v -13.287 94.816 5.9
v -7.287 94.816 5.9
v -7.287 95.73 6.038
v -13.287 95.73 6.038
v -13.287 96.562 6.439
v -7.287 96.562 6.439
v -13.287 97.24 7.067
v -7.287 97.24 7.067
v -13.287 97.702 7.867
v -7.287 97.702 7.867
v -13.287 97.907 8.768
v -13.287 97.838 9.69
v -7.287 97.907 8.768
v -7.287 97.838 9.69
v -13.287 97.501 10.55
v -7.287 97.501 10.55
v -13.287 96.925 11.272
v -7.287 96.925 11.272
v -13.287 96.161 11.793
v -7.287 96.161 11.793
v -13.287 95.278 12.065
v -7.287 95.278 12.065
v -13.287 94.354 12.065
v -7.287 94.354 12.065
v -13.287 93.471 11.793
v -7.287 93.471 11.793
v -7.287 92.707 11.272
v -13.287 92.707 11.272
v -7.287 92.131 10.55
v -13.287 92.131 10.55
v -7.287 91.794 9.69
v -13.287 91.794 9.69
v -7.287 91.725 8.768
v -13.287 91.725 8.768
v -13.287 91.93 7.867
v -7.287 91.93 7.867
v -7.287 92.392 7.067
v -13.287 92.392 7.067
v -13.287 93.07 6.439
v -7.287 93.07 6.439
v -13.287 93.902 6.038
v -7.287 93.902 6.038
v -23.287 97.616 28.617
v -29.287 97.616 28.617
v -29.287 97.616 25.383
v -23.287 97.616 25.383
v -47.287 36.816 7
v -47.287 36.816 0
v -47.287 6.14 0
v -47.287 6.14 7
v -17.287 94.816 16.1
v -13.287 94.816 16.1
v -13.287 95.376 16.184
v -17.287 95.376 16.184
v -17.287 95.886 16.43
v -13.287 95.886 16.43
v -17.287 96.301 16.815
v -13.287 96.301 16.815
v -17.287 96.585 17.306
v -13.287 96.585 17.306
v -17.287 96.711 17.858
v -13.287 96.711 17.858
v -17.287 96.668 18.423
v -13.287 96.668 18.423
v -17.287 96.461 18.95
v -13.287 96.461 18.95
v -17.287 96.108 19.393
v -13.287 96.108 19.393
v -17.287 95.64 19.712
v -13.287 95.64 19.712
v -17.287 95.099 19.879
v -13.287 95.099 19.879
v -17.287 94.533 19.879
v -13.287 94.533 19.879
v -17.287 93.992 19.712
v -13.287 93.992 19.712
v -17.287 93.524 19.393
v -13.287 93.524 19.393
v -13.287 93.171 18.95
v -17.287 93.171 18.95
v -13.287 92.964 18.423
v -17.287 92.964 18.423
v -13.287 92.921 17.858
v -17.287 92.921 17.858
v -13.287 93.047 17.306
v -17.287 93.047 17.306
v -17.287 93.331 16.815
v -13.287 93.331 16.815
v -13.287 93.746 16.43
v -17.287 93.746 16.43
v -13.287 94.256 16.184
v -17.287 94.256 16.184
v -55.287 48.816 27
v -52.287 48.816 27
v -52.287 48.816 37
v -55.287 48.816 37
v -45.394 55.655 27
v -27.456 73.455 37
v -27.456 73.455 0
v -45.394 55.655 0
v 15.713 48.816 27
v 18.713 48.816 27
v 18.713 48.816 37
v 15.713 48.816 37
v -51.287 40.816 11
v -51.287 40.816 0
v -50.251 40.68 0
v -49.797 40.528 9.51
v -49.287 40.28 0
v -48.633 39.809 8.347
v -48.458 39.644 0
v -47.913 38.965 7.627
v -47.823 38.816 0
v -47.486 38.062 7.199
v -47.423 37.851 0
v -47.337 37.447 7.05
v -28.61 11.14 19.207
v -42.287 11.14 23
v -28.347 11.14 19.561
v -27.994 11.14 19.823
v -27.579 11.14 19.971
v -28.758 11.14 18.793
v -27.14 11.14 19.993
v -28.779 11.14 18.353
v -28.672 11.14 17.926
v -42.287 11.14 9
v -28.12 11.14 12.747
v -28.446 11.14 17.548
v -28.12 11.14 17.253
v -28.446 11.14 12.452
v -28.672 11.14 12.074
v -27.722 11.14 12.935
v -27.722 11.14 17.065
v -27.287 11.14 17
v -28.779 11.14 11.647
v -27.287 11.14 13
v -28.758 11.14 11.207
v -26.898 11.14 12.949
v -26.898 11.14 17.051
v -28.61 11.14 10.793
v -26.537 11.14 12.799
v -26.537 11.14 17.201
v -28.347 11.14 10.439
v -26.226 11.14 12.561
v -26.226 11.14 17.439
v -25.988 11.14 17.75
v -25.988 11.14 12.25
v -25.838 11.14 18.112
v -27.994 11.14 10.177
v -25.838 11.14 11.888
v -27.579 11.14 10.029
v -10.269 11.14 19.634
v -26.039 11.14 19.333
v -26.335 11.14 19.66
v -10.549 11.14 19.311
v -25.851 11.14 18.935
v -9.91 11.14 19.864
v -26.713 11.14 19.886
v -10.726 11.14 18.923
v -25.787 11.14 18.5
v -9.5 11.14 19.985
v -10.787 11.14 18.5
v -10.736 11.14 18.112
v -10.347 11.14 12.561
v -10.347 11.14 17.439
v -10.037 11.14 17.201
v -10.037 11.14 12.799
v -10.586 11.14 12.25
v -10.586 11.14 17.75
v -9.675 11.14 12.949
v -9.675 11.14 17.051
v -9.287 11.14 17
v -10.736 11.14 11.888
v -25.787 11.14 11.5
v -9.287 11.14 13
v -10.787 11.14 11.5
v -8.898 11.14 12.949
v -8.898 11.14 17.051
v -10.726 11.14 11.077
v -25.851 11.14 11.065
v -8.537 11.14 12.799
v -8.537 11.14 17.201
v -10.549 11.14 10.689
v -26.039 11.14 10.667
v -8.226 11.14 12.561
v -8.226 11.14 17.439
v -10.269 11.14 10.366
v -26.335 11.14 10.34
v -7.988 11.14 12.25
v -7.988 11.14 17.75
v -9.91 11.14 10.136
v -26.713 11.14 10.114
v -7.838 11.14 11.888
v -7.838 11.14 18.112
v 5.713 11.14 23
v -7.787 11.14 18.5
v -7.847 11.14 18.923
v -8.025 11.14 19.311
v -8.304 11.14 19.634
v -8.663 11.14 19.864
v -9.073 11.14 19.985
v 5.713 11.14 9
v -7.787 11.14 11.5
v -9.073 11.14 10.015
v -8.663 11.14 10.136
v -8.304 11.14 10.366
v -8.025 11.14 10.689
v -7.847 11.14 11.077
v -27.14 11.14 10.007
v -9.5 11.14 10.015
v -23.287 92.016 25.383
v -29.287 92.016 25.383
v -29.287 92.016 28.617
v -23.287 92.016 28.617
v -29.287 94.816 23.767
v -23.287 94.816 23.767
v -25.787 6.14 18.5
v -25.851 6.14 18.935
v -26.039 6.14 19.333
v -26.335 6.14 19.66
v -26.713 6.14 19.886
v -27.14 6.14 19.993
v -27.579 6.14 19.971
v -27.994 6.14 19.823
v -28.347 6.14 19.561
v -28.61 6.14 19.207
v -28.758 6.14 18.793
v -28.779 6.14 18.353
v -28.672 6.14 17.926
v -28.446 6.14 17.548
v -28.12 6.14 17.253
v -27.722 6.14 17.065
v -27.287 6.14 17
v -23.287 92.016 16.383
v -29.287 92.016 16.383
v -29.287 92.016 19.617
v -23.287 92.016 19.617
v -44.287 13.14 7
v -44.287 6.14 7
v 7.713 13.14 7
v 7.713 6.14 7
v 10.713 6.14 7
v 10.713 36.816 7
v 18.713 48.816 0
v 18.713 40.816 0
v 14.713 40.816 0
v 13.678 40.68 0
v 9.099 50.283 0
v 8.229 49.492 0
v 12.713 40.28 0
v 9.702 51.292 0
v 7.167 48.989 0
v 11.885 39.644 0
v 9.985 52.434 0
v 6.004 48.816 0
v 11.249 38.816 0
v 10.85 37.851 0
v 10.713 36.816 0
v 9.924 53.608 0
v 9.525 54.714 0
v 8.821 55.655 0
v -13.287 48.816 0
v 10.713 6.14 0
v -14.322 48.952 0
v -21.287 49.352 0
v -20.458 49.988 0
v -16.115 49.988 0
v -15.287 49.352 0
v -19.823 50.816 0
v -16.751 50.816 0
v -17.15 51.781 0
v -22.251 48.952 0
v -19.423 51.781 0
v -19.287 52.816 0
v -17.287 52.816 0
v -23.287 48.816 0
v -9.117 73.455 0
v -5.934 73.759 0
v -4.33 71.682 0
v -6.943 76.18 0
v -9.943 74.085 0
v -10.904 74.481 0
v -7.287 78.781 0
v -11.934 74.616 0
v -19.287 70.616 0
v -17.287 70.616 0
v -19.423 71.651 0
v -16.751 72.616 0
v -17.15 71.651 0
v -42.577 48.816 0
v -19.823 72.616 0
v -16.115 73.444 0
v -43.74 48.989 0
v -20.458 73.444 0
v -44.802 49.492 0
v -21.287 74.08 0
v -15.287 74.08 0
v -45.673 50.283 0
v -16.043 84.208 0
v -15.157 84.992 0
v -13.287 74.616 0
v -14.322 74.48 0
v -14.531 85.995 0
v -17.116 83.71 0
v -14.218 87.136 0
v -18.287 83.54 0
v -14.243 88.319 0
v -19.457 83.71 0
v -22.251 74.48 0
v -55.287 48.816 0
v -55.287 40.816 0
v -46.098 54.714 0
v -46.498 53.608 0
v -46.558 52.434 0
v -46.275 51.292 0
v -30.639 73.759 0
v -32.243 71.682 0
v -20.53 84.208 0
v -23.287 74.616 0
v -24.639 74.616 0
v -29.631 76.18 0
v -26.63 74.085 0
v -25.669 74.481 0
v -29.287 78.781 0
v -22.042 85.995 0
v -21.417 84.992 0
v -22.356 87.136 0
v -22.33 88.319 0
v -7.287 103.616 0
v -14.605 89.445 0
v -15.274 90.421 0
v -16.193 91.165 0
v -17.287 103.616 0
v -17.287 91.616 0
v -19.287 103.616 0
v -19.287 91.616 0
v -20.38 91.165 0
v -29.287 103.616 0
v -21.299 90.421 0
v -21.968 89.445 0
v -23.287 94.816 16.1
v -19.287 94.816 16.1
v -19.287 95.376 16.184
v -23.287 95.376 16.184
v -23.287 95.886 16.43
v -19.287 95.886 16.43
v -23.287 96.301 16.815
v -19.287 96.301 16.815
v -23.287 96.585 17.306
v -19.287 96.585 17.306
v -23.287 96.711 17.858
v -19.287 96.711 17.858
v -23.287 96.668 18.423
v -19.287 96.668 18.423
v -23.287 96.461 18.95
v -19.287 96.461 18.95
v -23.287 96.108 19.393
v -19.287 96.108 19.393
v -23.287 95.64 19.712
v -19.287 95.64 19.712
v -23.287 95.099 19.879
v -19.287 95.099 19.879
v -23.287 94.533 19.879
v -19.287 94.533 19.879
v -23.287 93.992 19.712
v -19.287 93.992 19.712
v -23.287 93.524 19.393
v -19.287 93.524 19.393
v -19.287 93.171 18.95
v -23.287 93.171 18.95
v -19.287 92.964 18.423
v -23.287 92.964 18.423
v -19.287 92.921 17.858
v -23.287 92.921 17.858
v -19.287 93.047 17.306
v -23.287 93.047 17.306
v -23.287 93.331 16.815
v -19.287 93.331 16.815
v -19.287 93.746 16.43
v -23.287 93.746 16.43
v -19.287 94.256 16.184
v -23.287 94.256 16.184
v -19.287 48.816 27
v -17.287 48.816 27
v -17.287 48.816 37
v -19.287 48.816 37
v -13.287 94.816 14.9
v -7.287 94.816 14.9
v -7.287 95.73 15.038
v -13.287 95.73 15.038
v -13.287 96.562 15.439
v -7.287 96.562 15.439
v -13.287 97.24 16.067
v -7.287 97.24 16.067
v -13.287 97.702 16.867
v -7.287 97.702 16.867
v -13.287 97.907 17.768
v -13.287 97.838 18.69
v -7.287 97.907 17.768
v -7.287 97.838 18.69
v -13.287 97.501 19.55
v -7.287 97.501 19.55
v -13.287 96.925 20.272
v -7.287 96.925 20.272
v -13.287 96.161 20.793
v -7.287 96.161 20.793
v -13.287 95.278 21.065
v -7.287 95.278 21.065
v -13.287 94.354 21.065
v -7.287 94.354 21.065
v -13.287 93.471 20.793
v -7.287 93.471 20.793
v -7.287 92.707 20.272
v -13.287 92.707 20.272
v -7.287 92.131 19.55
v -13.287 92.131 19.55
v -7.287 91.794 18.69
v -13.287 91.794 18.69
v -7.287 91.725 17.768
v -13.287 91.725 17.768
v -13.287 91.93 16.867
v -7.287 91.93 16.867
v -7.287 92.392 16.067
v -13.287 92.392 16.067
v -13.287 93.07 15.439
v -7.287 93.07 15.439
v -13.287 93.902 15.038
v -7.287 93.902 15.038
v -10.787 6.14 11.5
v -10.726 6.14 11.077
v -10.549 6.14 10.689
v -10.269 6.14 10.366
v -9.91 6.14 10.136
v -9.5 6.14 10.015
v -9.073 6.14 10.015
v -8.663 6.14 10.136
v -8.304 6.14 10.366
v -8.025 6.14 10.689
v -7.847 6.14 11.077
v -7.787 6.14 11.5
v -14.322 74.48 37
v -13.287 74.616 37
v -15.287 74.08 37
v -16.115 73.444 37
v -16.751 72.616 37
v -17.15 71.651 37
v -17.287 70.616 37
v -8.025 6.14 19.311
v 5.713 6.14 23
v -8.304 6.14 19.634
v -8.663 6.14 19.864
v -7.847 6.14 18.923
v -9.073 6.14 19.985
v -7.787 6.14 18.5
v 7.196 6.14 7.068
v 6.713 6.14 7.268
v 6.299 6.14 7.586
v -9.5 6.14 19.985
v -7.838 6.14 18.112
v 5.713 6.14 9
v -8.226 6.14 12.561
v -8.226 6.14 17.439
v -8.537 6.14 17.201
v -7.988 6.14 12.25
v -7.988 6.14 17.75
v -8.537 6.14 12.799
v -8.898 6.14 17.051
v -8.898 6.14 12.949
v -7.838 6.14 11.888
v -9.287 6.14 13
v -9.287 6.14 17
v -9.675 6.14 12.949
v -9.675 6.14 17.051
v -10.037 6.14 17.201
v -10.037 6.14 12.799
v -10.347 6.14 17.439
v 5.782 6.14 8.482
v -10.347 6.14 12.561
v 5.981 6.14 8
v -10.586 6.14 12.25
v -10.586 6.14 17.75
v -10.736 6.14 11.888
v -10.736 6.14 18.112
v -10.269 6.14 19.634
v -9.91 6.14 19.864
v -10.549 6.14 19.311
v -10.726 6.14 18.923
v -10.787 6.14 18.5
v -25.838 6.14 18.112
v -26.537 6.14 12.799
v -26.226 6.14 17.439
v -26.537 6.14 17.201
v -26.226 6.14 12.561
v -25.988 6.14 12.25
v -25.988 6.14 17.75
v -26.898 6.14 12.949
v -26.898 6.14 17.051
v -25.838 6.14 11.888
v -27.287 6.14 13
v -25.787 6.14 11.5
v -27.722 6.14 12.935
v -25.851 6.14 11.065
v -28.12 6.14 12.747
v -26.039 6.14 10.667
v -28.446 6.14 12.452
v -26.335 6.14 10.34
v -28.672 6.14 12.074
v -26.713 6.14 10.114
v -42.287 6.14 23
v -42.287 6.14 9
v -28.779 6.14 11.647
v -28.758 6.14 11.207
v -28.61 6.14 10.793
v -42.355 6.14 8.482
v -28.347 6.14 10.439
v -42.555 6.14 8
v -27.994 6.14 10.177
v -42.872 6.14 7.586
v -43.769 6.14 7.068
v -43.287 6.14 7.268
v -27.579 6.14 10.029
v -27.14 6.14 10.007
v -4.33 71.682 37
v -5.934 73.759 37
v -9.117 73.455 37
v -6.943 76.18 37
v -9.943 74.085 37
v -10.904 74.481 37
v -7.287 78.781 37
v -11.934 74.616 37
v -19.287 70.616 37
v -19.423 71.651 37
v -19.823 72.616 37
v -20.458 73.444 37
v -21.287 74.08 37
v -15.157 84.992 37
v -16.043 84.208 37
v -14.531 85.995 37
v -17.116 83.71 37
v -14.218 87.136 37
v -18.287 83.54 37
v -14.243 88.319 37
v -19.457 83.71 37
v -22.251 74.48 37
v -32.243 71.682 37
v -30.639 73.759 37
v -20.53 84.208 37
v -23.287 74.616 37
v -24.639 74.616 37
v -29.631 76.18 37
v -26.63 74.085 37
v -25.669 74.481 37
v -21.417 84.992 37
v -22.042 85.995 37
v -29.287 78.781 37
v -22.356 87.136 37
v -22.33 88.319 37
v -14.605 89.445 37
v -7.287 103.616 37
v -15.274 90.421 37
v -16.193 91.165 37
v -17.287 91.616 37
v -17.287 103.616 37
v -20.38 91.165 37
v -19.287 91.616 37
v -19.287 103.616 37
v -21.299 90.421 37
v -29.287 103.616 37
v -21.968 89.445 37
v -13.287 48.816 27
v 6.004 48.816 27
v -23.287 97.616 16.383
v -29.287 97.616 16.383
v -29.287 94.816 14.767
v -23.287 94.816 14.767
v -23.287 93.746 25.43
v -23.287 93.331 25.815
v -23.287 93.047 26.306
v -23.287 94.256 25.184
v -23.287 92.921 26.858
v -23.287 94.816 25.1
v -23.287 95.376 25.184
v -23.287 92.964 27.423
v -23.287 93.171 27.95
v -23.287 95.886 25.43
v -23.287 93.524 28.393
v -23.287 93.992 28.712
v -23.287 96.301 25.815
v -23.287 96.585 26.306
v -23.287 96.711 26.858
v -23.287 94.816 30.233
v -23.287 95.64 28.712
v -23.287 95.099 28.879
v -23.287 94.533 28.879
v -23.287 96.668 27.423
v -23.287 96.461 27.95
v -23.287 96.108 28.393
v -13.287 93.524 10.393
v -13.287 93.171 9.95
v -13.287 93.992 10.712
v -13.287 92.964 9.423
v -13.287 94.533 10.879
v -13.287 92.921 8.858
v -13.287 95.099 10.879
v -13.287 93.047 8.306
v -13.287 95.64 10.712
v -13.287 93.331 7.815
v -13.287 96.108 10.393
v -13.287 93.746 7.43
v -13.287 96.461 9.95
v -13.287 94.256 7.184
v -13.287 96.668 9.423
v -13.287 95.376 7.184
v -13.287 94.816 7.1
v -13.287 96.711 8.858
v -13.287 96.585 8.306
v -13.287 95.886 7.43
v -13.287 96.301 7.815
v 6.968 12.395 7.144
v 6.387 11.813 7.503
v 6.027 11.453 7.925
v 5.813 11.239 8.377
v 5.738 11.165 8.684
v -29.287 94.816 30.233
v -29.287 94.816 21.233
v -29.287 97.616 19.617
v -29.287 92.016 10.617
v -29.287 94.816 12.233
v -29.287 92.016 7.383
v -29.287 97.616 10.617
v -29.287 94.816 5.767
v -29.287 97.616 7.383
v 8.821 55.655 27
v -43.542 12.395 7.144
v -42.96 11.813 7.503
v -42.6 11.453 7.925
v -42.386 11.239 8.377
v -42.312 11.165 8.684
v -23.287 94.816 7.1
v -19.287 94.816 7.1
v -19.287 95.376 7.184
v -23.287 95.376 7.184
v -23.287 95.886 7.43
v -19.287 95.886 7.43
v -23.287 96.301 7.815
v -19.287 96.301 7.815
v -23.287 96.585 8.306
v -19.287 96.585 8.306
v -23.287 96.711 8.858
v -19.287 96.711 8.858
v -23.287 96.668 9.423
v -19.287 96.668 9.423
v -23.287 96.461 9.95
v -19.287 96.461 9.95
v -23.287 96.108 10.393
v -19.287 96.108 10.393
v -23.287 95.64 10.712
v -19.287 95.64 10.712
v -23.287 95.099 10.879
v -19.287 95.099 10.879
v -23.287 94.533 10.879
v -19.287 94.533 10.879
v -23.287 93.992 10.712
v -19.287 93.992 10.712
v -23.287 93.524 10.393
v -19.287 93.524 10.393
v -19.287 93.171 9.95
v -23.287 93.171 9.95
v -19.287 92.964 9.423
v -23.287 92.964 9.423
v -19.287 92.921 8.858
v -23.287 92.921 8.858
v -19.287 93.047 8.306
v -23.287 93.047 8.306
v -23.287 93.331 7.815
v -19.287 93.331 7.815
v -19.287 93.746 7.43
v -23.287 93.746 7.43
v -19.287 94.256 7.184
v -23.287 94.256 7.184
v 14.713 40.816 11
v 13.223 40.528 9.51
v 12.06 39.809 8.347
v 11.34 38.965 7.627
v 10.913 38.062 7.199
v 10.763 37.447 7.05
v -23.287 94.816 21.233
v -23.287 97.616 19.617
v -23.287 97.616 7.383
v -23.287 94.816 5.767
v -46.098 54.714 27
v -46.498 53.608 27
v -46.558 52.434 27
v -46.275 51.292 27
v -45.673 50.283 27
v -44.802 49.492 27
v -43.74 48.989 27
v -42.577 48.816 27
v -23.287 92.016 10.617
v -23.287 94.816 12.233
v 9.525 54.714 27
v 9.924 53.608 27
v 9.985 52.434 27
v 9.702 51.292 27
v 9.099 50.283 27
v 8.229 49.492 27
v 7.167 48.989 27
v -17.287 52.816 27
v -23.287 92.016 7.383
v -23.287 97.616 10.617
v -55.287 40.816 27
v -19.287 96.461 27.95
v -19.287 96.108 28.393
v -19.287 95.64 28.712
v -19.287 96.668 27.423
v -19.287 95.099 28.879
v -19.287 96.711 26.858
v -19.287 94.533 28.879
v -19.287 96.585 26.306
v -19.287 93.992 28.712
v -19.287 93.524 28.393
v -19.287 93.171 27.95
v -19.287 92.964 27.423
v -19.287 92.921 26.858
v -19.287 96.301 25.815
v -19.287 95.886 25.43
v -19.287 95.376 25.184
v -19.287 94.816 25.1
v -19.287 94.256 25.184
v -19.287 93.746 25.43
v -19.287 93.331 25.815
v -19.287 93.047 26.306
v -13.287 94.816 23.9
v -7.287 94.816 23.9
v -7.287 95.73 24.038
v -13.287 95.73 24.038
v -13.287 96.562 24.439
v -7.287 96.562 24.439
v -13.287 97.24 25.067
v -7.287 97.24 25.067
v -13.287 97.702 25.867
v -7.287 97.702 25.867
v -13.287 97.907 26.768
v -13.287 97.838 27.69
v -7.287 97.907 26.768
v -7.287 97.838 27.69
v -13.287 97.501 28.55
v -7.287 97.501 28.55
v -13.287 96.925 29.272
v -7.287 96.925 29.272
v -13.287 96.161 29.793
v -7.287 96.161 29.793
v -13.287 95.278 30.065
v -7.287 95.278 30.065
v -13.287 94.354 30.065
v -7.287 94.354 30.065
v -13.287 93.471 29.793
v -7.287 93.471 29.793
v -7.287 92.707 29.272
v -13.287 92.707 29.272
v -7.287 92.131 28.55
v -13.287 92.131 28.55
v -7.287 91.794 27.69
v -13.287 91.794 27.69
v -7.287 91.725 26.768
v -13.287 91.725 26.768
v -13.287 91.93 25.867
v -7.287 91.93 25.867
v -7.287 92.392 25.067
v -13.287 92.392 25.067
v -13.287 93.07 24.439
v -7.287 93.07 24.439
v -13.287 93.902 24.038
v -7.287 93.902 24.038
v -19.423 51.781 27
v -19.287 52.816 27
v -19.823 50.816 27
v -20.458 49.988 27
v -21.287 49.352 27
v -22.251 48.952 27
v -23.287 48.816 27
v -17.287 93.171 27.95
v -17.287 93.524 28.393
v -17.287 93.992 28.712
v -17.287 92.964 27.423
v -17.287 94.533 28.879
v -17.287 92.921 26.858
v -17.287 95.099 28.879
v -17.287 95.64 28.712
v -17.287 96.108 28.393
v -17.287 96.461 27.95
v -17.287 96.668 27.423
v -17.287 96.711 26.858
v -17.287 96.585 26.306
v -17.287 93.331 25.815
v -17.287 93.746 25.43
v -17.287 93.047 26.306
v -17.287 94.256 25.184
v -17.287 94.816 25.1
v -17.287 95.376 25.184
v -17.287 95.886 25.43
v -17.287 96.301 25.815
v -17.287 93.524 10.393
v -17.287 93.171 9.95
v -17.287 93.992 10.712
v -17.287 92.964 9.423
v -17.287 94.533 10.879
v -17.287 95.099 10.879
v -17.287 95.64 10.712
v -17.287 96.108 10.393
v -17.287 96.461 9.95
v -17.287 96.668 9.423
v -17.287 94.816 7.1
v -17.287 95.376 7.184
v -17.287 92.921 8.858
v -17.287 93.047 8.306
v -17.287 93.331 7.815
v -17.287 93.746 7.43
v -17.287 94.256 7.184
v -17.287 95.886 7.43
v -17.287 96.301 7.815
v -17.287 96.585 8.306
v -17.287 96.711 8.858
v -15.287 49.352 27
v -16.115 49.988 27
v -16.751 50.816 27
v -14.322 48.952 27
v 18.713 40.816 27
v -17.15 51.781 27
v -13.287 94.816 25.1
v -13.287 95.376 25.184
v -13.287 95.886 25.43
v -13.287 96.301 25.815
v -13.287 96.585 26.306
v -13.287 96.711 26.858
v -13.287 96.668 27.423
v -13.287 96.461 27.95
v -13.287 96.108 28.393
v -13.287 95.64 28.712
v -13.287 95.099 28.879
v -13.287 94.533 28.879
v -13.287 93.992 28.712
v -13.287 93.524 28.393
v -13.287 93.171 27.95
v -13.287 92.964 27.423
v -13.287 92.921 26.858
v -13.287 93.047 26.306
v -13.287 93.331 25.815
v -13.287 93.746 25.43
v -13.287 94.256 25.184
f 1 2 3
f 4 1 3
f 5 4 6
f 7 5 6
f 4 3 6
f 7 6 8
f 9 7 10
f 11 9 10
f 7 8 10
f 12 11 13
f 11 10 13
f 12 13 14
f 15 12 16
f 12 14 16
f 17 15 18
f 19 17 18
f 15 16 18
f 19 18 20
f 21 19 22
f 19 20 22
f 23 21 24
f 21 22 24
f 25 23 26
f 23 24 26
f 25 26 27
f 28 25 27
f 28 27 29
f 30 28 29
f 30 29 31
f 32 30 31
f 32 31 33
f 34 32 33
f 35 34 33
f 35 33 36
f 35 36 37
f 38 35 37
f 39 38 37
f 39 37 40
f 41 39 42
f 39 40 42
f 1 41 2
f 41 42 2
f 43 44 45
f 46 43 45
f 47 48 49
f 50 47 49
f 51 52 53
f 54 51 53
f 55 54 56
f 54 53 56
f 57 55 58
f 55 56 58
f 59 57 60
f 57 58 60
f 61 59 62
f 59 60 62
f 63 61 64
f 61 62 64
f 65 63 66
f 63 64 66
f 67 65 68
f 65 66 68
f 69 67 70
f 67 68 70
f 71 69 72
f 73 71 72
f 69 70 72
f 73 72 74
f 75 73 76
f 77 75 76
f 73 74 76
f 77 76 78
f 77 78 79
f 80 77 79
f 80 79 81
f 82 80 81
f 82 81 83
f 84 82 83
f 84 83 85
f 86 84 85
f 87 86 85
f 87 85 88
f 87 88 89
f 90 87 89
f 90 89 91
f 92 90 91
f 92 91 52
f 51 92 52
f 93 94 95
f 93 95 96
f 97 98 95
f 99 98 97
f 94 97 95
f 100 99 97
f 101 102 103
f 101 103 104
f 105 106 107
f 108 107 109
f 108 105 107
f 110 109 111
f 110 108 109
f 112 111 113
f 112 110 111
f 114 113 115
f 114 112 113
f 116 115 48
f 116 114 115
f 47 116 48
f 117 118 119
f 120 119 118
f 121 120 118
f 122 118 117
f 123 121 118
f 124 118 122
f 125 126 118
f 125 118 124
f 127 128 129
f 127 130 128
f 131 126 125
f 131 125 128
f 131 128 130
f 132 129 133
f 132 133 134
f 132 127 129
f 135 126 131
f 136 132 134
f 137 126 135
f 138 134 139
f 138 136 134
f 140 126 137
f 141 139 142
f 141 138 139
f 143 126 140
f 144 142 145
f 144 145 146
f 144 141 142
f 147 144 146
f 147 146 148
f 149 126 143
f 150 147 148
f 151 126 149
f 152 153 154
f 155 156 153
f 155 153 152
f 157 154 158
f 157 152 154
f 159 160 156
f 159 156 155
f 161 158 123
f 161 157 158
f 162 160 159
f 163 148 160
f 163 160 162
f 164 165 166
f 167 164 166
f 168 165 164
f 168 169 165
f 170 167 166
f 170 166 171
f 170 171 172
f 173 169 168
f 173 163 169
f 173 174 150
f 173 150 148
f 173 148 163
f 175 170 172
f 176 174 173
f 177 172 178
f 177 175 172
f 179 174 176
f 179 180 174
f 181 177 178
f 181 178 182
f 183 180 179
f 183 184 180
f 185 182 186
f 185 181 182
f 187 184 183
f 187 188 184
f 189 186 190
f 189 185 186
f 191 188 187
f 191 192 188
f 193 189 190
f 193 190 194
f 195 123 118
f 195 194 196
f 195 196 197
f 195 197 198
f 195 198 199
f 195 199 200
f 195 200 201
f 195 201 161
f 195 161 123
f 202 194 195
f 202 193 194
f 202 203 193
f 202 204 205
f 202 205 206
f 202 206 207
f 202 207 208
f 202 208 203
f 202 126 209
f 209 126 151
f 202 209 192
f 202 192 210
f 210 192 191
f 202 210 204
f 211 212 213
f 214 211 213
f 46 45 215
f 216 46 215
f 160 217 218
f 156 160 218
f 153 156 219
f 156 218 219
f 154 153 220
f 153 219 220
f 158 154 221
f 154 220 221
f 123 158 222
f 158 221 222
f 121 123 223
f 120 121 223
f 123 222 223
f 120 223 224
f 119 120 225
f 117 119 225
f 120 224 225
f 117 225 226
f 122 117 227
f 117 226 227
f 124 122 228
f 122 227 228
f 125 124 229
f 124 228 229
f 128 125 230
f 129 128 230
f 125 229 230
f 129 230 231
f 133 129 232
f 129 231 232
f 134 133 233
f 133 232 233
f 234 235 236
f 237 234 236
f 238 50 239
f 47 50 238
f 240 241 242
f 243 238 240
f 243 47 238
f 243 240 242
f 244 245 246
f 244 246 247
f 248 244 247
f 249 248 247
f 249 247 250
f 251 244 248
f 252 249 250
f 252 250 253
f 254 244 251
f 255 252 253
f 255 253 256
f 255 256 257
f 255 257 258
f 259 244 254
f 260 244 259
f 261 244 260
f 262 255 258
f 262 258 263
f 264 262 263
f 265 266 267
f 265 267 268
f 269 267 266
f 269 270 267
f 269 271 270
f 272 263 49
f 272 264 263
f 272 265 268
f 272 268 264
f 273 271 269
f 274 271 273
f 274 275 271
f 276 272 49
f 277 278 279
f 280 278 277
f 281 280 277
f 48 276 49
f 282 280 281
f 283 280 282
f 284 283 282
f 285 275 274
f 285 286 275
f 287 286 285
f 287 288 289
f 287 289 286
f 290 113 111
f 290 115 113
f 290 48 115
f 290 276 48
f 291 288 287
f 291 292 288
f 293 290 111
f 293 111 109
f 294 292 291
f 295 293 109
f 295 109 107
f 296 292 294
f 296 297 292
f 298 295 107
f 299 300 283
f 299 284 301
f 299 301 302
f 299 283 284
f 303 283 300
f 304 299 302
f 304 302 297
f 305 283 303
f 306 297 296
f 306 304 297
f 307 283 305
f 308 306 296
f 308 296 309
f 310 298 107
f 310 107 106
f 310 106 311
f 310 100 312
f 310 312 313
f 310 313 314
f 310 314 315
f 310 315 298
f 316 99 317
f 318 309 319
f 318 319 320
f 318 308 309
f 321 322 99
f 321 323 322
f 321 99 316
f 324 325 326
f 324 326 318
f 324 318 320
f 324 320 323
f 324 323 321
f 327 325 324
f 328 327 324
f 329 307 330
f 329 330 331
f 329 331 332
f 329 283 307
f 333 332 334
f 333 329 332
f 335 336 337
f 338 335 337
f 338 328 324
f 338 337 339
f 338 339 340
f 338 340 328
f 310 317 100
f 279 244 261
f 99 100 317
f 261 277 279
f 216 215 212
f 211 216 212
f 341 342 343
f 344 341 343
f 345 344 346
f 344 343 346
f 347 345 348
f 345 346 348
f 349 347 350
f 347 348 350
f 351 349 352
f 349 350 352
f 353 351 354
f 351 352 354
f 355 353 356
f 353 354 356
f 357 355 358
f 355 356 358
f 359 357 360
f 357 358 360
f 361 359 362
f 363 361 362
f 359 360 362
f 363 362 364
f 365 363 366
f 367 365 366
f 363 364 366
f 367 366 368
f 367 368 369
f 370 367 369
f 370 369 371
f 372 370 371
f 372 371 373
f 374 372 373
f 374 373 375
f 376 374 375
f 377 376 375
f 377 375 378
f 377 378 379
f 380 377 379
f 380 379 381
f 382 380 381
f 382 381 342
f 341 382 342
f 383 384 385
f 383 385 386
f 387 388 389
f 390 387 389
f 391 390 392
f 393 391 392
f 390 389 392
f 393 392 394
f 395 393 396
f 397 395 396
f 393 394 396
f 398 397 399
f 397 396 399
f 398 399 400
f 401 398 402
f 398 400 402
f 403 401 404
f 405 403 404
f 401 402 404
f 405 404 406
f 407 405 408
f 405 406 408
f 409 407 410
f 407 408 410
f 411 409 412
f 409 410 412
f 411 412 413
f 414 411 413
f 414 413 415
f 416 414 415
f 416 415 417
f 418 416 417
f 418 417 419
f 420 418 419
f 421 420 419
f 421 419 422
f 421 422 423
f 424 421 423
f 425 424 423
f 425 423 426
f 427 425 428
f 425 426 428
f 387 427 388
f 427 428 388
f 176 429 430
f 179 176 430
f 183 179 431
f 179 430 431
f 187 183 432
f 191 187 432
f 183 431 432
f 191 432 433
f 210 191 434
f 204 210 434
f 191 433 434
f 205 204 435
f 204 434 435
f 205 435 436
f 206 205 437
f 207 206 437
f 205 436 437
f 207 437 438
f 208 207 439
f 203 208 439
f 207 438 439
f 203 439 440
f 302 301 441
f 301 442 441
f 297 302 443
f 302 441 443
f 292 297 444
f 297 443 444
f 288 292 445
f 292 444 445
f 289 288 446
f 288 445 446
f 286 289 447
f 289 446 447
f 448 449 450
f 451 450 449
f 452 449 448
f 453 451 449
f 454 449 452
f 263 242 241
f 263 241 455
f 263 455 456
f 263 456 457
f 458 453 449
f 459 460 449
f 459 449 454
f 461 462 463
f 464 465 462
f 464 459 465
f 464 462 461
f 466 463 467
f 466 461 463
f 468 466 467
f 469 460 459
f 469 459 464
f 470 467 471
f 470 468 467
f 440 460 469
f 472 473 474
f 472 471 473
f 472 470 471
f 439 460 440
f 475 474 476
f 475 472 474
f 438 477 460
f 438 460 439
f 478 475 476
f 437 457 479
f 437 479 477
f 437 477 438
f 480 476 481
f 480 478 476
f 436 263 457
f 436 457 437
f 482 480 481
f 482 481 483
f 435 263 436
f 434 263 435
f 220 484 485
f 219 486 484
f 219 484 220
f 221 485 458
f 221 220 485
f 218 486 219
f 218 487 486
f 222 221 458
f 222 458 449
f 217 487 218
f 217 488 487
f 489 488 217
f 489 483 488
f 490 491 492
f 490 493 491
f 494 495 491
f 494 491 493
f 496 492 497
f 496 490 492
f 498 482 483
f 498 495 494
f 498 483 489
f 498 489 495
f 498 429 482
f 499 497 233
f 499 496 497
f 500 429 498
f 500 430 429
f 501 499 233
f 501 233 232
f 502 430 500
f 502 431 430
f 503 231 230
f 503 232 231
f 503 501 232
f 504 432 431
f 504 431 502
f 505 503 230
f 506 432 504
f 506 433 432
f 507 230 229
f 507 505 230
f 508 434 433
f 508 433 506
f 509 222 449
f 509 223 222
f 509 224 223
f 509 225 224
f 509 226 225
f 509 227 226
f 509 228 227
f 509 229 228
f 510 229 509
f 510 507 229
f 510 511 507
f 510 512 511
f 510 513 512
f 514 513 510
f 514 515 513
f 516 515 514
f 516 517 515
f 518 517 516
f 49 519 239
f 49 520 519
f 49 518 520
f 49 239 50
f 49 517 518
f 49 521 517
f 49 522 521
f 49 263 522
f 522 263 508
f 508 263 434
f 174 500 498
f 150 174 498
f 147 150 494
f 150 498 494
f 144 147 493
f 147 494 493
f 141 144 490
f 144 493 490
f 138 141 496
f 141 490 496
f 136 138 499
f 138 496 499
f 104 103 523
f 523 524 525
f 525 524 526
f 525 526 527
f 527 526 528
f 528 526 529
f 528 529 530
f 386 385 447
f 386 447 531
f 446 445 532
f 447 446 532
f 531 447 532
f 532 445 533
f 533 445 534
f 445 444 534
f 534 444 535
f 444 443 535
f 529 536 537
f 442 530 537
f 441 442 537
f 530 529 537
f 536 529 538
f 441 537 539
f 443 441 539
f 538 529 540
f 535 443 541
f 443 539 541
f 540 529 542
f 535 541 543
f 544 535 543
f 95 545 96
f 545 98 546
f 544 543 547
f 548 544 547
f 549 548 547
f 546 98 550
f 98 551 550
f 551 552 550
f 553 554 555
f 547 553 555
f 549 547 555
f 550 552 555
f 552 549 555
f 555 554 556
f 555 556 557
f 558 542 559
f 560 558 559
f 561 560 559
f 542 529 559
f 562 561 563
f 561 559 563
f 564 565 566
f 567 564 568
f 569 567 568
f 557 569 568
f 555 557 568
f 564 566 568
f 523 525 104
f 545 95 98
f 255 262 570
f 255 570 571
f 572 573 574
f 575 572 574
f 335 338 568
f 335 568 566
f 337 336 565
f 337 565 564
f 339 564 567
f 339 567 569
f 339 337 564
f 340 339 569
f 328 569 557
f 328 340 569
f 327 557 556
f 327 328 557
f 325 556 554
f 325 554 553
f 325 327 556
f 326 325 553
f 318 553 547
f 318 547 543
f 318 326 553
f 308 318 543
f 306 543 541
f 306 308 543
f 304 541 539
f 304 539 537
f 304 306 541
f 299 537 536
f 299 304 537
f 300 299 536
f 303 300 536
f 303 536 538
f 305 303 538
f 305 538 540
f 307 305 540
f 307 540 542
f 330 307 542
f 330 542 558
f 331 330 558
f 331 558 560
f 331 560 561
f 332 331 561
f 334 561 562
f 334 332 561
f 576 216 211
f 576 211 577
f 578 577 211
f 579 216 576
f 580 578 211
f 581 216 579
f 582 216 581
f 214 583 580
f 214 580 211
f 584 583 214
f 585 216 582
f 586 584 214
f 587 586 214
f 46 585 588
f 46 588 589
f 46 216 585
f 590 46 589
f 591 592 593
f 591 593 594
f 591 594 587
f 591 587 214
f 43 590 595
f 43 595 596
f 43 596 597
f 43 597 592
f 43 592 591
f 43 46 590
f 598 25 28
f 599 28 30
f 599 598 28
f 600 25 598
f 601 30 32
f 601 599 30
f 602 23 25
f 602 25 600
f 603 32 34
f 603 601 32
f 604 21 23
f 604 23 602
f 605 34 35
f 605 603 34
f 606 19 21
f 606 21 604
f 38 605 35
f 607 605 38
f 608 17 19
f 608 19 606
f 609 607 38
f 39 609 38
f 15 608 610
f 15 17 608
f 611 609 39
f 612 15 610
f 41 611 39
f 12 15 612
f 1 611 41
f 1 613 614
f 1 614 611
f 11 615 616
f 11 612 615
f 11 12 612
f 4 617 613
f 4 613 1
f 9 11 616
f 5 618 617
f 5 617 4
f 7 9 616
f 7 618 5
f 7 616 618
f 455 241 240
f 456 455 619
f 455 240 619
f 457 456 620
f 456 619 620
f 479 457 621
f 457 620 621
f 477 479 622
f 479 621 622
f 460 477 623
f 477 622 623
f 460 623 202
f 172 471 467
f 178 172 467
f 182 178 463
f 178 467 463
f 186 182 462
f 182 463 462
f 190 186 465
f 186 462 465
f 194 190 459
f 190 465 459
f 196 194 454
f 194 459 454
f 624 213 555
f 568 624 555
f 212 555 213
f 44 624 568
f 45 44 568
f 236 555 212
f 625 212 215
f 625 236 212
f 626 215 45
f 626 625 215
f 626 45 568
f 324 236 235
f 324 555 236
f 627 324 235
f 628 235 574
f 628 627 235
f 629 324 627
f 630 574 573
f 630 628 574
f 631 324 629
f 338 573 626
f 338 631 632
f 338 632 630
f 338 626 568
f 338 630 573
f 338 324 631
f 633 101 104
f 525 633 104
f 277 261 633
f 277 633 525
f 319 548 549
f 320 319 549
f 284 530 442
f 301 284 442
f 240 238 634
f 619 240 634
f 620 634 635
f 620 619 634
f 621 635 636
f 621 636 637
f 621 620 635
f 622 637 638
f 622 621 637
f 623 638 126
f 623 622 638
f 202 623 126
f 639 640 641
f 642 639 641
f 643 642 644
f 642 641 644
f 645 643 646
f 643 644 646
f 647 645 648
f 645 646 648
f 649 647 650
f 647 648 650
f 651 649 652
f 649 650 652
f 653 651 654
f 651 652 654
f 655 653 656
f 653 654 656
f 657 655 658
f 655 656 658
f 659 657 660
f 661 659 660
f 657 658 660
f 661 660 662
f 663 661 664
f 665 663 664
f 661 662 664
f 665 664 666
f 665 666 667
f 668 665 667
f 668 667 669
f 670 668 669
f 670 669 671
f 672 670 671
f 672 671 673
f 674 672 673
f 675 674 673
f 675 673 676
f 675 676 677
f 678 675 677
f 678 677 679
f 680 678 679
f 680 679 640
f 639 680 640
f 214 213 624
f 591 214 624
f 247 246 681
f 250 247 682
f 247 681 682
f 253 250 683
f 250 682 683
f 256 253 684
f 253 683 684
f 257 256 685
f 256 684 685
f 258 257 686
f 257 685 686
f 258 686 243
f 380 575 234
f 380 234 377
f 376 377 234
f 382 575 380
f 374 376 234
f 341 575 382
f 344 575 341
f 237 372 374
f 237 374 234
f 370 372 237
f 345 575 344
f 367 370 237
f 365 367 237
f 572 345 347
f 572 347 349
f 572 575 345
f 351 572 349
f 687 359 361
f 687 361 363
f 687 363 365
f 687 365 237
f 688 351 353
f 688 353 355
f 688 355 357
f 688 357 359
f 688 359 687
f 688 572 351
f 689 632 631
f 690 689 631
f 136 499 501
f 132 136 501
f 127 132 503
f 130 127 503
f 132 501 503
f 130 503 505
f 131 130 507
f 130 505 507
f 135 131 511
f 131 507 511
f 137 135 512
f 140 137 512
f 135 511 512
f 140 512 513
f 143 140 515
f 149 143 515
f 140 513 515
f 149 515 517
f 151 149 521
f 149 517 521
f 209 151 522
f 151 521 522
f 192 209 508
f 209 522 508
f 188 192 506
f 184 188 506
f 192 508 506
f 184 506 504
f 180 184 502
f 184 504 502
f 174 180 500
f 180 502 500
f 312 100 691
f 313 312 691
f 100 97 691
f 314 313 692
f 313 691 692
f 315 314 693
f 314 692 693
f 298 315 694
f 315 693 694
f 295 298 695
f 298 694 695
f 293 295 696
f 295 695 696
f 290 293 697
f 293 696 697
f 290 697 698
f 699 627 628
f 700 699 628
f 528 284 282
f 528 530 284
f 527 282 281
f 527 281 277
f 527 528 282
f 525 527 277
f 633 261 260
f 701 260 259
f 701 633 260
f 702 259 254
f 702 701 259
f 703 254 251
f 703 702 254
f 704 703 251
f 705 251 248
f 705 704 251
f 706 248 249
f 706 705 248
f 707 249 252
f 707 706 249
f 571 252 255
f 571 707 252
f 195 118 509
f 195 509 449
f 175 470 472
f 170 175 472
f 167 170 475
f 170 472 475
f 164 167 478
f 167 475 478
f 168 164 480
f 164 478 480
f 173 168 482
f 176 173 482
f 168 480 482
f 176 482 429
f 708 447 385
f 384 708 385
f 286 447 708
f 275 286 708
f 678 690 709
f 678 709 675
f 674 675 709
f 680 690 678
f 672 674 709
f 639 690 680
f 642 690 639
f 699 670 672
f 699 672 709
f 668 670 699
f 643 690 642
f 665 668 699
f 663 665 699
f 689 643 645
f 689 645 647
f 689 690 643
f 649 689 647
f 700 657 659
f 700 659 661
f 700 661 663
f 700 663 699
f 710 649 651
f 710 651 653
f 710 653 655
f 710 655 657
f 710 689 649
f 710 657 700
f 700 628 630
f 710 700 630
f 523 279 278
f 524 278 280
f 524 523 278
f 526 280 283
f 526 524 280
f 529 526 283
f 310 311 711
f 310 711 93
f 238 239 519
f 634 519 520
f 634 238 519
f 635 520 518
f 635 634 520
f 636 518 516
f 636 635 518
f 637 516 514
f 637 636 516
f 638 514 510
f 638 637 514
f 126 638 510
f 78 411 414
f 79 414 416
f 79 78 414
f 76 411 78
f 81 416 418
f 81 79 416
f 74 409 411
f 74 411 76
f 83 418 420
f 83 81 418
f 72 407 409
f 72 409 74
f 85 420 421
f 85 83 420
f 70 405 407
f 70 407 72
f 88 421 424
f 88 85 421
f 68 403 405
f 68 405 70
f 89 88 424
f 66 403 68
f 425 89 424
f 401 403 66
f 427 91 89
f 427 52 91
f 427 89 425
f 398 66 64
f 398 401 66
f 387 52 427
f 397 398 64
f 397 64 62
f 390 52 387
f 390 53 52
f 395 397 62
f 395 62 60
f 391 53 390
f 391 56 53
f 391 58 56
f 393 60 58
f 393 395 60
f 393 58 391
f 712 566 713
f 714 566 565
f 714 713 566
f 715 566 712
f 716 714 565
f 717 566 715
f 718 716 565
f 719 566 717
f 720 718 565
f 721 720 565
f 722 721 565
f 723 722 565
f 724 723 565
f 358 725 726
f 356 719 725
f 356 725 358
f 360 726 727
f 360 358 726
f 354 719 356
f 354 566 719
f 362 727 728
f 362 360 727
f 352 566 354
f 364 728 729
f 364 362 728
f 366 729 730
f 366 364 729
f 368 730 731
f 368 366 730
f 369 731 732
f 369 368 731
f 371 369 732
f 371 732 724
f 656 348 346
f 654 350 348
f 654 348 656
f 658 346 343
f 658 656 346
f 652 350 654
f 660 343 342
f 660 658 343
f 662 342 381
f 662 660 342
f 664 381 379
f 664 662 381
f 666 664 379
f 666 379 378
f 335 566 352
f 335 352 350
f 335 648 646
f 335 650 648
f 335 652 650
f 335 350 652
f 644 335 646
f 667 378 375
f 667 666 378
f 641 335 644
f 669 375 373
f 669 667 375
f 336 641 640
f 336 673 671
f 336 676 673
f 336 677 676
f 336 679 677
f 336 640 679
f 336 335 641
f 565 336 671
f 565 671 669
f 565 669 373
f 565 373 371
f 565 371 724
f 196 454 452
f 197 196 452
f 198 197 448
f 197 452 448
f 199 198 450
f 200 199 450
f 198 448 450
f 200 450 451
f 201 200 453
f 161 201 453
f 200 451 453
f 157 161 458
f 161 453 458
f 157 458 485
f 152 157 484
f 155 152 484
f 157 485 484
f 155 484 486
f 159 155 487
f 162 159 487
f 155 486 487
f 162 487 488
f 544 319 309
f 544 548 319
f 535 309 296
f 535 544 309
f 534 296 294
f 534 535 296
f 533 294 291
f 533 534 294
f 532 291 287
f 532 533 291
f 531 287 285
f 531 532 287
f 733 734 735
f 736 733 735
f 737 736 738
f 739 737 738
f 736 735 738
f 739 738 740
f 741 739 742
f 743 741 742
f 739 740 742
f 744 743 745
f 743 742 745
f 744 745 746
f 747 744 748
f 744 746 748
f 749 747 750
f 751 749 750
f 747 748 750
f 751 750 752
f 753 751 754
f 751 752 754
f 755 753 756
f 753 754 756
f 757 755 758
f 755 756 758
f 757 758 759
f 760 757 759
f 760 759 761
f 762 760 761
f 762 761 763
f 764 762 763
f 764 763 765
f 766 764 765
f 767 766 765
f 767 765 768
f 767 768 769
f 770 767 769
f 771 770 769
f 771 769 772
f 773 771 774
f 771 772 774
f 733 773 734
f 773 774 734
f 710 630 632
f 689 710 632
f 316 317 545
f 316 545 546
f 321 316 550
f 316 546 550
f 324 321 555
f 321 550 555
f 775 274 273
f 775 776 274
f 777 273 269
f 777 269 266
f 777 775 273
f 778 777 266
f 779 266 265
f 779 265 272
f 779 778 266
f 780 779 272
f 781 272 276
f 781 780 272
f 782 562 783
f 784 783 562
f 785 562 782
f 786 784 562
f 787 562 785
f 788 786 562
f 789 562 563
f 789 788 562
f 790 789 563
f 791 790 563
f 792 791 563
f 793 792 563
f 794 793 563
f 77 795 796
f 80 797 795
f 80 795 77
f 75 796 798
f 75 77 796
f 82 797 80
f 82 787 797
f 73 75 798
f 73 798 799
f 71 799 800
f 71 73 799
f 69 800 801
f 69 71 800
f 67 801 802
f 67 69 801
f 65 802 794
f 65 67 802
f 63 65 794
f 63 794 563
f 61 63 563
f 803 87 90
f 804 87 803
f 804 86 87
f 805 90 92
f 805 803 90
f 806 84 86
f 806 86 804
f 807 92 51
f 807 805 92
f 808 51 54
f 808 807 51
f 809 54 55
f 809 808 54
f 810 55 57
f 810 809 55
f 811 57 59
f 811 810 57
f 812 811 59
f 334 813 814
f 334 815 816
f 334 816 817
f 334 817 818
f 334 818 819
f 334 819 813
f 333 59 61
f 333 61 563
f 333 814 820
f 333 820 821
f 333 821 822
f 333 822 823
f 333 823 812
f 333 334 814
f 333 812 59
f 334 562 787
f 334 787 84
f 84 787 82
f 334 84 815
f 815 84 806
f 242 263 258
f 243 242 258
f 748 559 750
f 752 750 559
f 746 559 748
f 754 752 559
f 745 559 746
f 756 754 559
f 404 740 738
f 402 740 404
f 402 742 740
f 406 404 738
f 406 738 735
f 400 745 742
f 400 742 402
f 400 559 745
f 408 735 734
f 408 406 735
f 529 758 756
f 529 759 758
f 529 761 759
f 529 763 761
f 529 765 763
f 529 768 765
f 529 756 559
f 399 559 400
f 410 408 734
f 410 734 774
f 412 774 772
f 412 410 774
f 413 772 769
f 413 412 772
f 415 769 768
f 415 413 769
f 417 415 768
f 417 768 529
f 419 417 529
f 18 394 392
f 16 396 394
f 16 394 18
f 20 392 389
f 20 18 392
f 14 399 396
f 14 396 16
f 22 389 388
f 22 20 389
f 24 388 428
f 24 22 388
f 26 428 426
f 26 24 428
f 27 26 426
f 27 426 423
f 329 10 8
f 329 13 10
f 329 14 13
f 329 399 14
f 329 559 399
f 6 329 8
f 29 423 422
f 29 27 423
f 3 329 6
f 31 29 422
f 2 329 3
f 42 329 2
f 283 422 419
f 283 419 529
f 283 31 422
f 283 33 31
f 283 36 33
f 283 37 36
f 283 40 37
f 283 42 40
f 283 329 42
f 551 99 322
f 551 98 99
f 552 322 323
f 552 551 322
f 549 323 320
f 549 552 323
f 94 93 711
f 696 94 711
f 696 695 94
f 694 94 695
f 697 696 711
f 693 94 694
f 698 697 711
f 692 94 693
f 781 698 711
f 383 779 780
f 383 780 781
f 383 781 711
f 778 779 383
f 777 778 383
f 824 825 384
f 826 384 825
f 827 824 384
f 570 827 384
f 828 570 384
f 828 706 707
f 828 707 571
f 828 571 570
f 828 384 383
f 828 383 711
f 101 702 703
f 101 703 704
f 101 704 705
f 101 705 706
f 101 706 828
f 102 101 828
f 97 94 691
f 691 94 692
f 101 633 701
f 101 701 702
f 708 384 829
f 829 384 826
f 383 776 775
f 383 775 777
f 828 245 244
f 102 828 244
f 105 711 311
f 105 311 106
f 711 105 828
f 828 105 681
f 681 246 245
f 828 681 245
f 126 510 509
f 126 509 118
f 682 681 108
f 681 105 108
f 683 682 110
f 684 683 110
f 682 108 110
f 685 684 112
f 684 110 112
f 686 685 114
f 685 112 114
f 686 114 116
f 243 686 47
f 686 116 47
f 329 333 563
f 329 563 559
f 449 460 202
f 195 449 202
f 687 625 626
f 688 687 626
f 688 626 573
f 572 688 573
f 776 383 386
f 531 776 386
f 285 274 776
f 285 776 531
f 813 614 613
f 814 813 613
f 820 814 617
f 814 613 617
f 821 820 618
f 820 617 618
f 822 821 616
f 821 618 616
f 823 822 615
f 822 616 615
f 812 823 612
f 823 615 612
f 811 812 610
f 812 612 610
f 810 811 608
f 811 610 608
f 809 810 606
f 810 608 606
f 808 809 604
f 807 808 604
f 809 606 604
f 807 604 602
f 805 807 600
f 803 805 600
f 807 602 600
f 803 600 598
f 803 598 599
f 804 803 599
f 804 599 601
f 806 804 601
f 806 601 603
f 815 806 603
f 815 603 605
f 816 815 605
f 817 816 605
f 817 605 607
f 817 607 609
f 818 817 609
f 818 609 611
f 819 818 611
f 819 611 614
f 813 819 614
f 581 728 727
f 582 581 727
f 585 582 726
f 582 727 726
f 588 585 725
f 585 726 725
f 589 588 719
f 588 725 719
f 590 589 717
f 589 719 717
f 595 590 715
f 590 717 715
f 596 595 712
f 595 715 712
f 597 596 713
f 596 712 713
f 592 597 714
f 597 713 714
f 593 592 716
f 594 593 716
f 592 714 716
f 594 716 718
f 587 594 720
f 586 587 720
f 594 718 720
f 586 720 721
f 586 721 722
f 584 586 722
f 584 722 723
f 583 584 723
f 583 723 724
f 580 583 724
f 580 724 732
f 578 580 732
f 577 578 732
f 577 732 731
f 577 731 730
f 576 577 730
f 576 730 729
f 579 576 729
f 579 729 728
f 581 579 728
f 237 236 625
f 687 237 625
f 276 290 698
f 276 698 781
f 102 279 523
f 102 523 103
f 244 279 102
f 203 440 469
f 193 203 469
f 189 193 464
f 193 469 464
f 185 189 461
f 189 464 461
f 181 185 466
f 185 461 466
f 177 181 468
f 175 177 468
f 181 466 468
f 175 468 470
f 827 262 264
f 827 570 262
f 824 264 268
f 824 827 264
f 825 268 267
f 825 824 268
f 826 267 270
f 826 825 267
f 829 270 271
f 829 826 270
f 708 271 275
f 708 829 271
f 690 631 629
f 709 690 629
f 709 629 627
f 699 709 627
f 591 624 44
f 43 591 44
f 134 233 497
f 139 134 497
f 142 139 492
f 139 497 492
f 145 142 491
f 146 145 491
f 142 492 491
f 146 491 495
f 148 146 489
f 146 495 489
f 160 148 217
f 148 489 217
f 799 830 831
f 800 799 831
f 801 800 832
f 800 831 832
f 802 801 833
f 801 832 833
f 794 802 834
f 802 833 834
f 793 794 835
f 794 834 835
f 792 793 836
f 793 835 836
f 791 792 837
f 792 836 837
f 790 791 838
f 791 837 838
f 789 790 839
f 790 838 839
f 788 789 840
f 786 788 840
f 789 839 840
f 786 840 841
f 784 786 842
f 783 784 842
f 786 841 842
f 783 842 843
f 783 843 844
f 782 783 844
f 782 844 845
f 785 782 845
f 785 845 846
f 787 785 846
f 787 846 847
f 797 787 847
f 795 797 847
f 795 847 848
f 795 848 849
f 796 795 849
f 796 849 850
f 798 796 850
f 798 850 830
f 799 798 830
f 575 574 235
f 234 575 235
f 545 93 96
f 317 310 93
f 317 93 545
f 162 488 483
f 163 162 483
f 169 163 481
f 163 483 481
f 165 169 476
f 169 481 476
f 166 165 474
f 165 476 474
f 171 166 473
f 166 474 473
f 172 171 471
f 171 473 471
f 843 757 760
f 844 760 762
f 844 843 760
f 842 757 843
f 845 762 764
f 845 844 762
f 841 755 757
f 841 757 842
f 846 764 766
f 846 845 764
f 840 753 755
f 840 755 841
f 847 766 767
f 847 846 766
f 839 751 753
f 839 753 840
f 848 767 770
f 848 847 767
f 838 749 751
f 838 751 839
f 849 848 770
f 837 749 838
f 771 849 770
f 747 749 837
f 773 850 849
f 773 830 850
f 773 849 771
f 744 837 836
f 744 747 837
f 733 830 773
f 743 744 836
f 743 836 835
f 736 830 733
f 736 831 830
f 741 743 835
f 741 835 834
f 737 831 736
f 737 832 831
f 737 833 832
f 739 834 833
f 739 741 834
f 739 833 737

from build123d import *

# Parameters (mm, degrees)
SALIENTE_EXTRUIR1_DEPTH    = 7
CROQUIS2_7_W               = 74
CROQUIS2_7_H               = 8
SALIENTE_EXTRUIR3_DEPTH    = 27
SALIENTE_EXTRUIR5_DEPTH    = 37
CROQUIS10_R                = 1.9
CORTAR_EXTRUIR3_DEPTH      = 22
CROQUIS11_R                = 3.1
CORTAR_EXTRUIR4_DEPTH      = 6
CORTAR_EXTRUIR5_DEPTH      = 6
CORTAR_EXTRUIR6_START      = -7
CORTAR_EXTRUIR6_DEPTH      = 7
SALIENTE_EXTRUIR6_DEPTH    = 16
CROQUIS18_R                = 1.5
CORTAR_EXTRUIR8_DEPTH      = 10
CORTAR_EXTRUIR9_DEPTH      = 124.133618358
CORTAR_EXTRUIR9_DEPTH_BACK = 37
REDONDEO1_R                = 4
REDONDEO2_R                = 4
REDONDEO3_R                = 2
REDONDEO5_R                = 10


with BuildPart() as part:
    # Croquis2 → Saliente-Extruir1 (new body)
    with BuildSketch(Plane.XY):
        with BuildLine():
            Line((-47.286620614, 40.816010109), (-47.286620614, -49.183989891))
            ThreePointArc((-47.286620614, -49.183989891), (-45.236368082, -54.133737359), (-40.286620614, -56.183989891))
            Line((-40.286620614, -56.183989891), (3.713379386, -56.183989891))
            ThreePointArc((3.713379386, -56.183989891), (8.663126854, -54.133737359), (10.713379386, -49.183989891))
            Line((10.713379386, -49.183989891), (10.713379386, 40.816010109))
            Line((10.713379386, 40.816010109), (-47.286620614, 40.816010109))
        make_face()
    extrude(amount=SALIENTE_EXTRUIR1_DEPTH)

    # Croquis2<7> → Saliente-Extruir3 (add)
    with BuildSketch(Plane.XY):
        with Locations((-18.286620614, 44.816010109)):
            Rectangle(CROQUIS2_7_W, CROQUIS2_7_H)
    extrude(amount=SALIENTE_EXTRUIR3_DEPTH)

    # Croquis2<14> → Saliente-Extruir5 (add)
    with BuildSketch(Plane.XY):
        with BuildLine():
            Line((-55.286620614, 48.816010109), (-30.786620614, 48.816010109))
            Line((-30.786620614, 48.816010109), (-5.786620614, 48.816010109))
            Line((-5.786620614, 48.816010109), (18.713379386, 48.816010109))
            Line((18.713379386, 48.816010109), (-7.286620614, 74.616010109))
            Line((-7.286620614, 74.616010109), (-7.286620614, 103.616010109))
            Line((-7.286620614, 103.616010109), (-17.286620614, 103.616010109))
            Line((-17.286620614, 103.616010109), (-17.286620614, 91.616010109))
            ThreePointArc((-17.286620614, 91.616010109), (-18.286620614, 83.539831039), (-19.286620614, 91.616010109))
            Line((-19.286620614, 91.616010109), (-19.286620614, 103.616010109))
            Line((-19.286620614, 103.616010109), (-29.286620614, 103.616010109))
            Line((-29.286620614, 103.616010109), (-29.286620614, 74.616010109))
            Line((-29.286620614, 74.616010109), (-55.286620614, 48.816010109))
        make_face()
    extrude(amount=SALIENTE_EXTRUIR5_DEPTH)

    # Croquis10 → Cortar-Extruir3 (cut)
    with BuildSketch(Plane(origin=(-7.286620614, 0, 0), x_dir=(0, 0, -1), z_dir=(1, 0, 0))):
        with Locations((-9, 94.816010109)):
            Circle(CROQUIS10_R)
        with Locations((-18, 94.816010109)):
            Circle(CROQUIS10_R)
        with Locations((-27, 94.816010109)):
            Circle(CROQUIS10_R)
    extrude(amount=-CORTAR_EXTRUIR3_DEPTH, mode=Mode.SUBTRACT)

    # Croquis11 → Cortar-Extruir4 (cut)
    with BuildSketch(Plane(origin=(-7.286620614, 0, 0), x_dir=(0, 0, -1), z_dir=(1, 0, 0))):
        with Locations((-27, 94.816010109)):
            Circle(CROQUIS11_R)
        with Locations((-18, 94.816010109)):
            Circle(CROQUIS11_R)
        with Locations((-9, 94.816010109)):
            Circle(CROQUIS11_R)
    extrude(amount=-CORTAR_EXTRUIR4_DEPTH, mode=Mode.SUBTRACT)

    # Croquis12 → Cortar-Extruir5 (cut)
    with BuildSketch(Plane.ZY.offset(29.286620614)):
        Polygon((21.233161507, 94.816010109), (19.616580754, 97.616010109), (16.383419246, 97.616010109), (14.766838493, 94.816010109), (16.383419246, 92.016010109), (19.616580754, 92.016010109), align=None)
        Polygon((12.233161507, 94.816010109), (10.616580754, 97.616010109), (7.383419246, 97.616010109), (5.766838493, 94.816010109), (7.383419246, 92.016010109), (10.616580754, 92.016010109), align=None)
        Polygon((30.233161507, 94.816010109), (28.616580754, 97.616010109), (25.383419246, 97.616010109), (23.766838493, 94.816010109), (25.383419246, 92.016010109), (28.616580754, 92.016010109), align=None)
    extrude(amount=-CORTAR_EXTRUIR5_DEPTH, mode=Mode.SUBTRACT)

    # Croquis17 → Cortar-Extruir6 (cut)
    with BuildSketch(Plane.XY.offset(7).offset(CORTAR_EXTRUIR6_START)):
        with BuildLine():
            Line((-55.286620614, 6.139831039), (-55.286620614, -5.183989891))
            Line((-55.286620614, -5.183989891), (-47.286620614, -5.183989891))
            Line((-47.286620614, -5.183989891), (-47.286620614, -49.183989891))
            ThreePointArc((-47.286620614, -49.183989891), (-45.236368082, -54.133737359), (-40.286620614, -56.183989891))
            Line((-40.286620614, -56.183989891), (3.713379386, -56.183989891))
            ThreePointArc((3.713379386, -56.183989891), (8.663126854, -54.133737359), (10.713379386, -49.183989891))
            Line((10.713379386, -49.183989891), (10.713379386, -5.183989891))
            Line((10.713379386, -5.183989891), (18.713379386, -5.183989891))
            Line((18.713379386, -5.183989891), (18.713379386, 6.139831039))
            Line((18.713379386, 6.139831039), (-55.286620614, 6.139831039))
        make_face()
    extrude(amount=CORTAR_EXTRUIR6_DEPTH, mode=Mode.SUBTRACT)

    # Croquis17<5> → Saliente-Extruir6 (add)
    with BuildSketch(Plane.XY.offset(7)):
        Polygon((-42.286620614, 6.139831039), (-18.286620614, 6.139831039), (5.713379386, 6.139831039), (5.713379386, 11.139831039), (-42.286620614, 11.139831039), align=None)
    extrude(amount=SALIENTE_EXTRUIR6_DEPTH)

    # Croquis18 → Cortar-Extruir8 (cut)
    with BuildSketch(Plane.XZ.offset(-6.139831039)):
        with Locations((-27.286620614, 18.5)):
            Circle(CROQUIS18_R)
        with Locations((-9.286620614, 18.5)):
            Circle(CROQUIS18_R)
        with Locations((-27.286620614, 11.5)):
            Circle(CROQUIS18_R)
        with Locations((-9.286620614, 11.5)):
            Circle(CROQUIS18_R)
    extrude(amount=-CORTAR_EXTRUIR8_DEPTH, mode=Mode.SUBTRACT)

    # Croquis19 → Cortar-Extruir9 (cut, two sides: drawn at the far end of the back side and taken through both)
    with BuildSketch(Plane.XY.offset(37).offset(-CORTAR_EXTRUIR9_DEPTH_BACK)):
        Polygon((-52.286620614, 48.816010109), (-19.286620614, 48.816010109), (-19.286620614, 74.616010109), (-26.286620614, 74.616010109), align=None)
        Polygon((-17.286620614, 74.616010109), (-17.286620614, 48.816010109), (15.713379386, 48.816010109), (-10.286620614, 74.616010109), align=None)
    extrude(amount=CORTAR_EXTRUIR9_DEPTH + CORTAR_EXTRUIR9_DEPTH_BACK, mode=Mode.SUBTRACT)

    # Redondeo1
    redondeo1_edges = [part.edges().sort_by_distance(p)[0] for p in [
        (-19.286620614, 48.816010109, 13.5),
        (15.713379386, 48.816010109, 13.5),
        (-17.286620614, 74.616010109, 18.5),
        (-10.286620614, 74.616010109, 18.5),
        (-19.286620614, 74.616010109, 18.5),
        (-26.286620614, 74.616010109, 18.5),
        (-17.286620614, 48.816010109, 13.5),
        (-52.286620614, 48.816010109, 13.5),
    ]]
    fillet(redondeo1_edges, radius=REDONDEO1_R)

    # Redondeo2
    redondeo2_edges = [part.edges().sort_by_distance(p)[0] for p in [
        (-47.286620614, 40.816010109, 3.5),
        (10.713379386, 40.816010109, 3.5),
        (-18.286620614, 40.816010109, 7),
    ]]
    fillet(redondeo2_edges, radius=REDONDEO2_R)

    # Redondeo3
    redondeo3_edges = [part.edges().sort_by_distance(p)[0] for p in [
        (-18.286620614, 11.139831039, 7),
        (5.713379386, 8.639831039, 7),
        (-42.286620614, 8.639831039, 7),
    ]]
    fillet(redondeo3_edges, radius=REDONDEO3_R)

    # Redondeo5
    redondeo5_edges = [part.edges().sort_by_distance(p)[0] for p in [
        (-7.286620614, 74.616010109, 18.5),
        (-29.286620614, 74.616010109, 18.5),
    ]]
    fillet(redondeo5_edges, radius=REDONDEO5_R)


solid = part.part
